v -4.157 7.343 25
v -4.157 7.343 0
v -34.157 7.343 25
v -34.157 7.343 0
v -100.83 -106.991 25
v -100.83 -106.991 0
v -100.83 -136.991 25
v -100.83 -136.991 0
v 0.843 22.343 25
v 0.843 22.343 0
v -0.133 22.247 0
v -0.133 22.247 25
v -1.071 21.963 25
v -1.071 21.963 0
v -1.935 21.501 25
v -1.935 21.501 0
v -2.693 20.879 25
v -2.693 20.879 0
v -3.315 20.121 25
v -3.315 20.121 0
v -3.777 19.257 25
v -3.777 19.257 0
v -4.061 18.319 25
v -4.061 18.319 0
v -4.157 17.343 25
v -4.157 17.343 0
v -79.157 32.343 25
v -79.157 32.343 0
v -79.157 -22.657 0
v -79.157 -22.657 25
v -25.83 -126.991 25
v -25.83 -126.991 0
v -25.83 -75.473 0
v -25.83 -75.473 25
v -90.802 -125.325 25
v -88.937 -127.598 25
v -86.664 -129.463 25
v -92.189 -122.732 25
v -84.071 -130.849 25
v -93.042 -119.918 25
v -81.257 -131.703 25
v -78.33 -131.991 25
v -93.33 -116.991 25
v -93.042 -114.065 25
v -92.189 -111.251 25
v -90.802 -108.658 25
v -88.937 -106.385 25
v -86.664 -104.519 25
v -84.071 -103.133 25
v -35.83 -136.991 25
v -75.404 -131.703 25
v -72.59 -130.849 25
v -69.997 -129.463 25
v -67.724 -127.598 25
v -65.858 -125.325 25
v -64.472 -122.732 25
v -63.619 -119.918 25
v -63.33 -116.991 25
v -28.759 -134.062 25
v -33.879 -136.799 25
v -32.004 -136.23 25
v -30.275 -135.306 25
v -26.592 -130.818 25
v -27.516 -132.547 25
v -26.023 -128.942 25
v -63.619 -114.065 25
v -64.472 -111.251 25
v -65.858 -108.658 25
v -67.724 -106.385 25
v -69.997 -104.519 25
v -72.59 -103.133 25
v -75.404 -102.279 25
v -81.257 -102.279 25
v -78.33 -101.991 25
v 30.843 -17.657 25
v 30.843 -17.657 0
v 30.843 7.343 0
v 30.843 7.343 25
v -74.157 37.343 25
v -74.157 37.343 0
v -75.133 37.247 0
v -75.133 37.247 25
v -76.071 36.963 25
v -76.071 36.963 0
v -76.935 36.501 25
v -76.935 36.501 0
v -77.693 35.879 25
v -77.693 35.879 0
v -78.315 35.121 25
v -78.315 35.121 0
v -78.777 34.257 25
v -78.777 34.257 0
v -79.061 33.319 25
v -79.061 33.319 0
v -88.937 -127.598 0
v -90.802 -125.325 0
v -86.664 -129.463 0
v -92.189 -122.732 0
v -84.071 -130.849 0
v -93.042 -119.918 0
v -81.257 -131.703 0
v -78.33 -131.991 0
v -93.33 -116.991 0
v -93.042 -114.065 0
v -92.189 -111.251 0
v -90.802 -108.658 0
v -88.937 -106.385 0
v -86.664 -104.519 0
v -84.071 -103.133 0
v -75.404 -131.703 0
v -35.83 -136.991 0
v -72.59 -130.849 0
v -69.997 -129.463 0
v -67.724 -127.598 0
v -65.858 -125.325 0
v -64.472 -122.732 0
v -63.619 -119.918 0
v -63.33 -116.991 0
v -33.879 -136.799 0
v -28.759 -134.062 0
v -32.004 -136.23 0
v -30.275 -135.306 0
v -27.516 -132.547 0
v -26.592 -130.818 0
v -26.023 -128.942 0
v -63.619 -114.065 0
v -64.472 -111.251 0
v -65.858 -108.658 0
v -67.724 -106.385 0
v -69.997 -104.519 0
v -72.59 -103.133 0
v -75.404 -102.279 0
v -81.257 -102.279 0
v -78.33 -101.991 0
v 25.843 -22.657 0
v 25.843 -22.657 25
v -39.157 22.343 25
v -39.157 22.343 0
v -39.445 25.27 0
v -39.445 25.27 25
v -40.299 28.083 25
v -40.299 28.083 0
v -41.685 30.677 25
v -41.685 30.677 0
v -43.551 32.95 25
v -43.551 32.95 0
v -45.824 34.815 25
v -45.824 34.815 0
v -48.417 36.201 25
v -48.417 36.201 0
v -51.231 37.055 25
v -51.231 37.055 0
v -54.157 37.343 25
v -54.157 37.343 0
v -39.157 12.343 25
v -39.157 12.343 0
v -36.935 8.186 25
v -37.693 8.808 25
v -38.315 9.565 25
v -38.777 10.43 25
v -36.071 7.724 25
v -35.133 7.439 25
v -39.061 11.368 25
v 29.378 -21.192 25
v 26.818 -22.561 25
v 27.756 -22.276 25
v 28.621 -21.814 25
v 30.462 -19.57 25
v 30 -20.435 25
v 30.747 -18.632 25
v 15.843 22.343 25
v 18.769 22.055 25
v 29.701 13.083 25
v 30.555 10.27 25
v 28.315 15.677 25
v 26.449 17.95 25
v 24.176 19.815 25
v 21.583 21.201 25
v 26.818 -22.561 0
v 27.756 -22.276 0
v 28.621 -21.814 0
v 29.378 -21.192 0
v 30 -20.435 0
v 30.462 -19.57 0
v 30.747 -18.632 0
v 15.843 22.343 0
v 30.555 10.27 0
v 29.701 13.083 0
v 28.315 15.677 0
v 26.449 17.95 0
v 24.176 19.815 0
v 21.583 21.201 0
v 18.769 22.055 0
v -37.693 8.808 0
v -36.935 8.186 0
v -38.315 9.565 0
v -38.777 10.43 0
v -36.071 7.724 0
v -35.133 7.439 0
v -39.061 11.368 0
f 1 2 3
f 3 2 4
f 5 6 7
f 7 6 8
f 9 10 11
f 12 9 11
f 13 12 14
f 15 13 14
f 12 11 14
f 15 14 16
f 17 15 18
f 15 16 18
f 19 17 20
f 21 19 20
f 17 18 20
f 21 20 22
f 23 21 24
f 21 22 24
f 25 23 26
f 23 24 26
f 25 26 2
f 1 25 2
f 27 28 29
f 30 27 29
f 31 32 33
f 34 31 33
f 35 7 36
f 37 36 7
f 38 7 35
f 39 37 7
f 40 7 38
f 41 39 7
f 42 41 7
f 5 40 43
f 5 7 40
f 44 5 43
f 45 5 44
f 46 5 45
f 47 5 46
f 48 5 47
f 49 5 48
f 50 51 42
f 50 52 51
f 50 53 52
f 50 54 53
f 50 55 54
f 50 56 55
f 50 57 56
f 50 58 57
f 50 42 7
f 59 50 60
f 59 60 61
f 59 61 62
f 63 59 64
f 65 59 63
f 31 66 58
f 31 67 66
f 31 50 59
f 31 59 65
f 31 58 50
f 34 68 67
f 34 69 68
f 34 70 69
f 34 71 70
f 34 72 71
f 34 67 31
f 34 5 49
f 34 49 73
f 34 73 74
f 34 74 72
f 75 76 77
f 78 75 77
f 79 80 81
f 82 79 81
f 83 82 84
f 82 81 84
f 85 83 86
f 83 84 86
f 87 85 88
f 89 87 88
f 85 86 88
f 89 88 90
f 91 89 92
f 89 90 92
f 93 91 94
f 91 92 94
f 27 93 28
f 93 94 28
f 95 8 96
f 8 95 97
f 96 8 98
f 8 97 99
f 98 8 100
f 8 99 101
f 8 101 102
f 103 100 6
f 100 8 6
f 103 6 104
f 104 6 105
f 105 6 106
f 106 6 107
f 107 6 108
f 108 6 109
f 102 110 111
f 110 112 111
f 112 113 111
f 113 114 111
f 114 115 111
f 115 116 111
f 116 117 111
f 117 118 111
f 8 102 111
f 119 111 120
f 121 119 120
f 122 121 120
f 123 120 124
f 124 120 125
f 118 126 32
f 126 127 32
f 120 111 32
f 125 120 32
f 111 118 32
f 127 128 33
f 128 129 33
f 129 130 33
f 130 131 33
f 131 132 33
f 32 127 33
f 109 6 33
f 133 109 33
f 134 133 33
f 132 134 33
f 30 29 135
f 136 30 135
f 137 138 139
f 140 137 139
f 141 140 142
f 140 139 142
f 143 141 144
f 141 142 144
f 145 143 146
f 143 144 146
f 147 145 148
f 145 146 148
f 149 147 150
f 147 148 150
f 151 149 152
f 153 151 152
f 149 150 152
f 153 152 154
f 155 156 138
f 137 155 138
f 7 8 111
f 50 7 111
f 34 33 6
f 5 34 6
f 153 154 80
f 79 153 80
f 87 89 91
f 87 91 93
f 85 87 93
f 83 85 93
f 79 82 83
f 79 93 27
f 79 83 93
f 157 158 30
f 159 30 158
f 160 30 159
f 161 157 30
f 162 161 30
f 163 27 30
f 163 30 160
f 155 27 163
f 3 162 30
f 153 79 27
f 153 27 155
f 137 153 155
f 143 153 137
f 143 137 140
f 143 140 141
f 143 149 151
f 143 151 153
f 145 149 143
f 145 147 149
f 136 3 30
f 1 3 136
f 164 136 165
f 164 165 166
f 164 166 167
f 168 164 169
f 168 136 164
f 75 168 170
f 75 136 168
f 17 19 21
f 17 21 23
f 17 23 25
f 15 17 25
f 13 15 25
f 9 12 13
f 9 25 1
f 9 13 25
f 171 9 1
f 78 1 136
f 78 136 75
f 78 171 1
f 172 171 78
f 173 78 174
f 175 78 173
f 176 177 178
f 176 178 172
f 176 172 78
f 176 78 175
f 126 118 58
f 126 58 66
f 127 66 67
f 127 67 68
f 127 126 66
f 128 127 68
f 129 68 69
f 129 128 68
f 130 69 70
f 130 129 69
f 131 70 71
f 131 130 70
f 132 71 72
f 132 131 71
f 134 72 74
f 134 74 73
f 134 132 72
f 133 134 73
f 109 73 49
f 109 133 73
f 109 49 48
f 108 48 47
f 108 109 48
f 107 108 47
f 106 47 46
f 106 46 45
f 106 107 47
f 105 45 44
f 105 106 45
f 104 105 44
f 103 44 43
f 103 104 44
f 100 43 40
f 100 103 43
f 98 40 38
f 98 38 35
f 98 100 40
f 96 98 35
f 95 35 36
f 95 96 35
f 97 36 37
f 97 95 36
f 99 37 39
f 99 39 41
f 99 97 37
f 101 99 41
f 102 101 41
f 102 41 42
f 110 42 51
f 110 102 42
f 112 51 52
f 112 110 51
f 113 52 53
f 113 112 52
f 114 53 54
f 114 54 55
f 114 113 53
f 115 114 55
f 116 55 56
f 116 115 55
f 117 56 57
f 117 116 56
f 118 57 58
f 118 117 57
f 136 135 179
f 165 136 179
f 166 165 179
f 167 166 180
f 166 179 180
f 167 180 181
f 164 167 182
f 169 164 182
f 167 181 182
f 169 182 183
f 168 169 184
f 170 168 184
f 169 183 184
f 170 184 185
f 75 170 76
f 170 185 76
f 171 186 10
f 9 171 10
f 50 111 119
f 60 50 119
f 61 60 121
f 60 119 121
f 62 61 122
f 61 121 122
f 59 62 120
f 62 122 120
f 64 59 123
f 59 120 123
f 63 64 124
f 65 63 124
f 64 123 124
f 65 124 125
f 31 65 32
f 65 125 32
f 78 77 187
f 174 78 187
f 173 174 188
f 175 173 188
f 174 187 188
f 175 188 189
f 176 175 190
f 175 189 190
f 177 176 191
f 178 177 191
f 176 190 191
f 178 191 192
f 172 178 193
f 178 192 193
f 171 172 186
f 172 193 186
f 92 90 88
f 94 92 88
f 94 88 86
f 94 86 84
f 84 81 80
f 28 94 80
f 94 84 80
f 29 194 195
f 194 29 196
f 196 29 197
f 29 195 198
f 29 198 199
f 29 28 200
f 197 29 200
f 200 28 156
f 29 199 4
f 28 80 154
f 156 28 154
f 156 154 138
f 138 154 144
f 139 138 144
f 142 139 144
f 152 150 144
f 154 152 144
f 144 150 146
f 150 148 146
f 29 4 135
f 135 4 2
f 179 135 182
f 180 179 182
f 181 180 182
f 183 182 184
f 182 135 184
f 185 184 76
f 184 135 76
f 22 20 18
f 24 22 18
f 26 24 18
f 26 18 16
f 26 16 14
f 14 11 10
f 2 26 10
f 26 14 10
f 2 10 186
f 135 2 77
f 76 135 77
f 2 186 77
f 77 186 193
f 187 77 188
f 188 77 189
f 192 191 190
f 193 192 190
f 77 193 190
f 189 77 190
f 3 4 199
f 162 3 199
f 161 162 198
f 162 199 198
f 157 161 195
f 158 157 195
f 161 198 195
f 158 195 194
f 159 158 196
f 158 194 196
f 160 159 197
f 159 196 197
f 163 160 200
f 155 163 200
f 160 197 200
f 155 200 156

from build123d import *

# Parameters (mm, degrees)
F1_DEPTH = 25
F0_R     = 15
F2_DEPTH = 25


with BuildPart() as f1:
    # F0 (on Top) → F1 (new body)
    with BuildSketch(Plane.XY):
        with BuildLine():
            Line((-79.157276, 32.343172), (-79.157276, -22.656828))
            Line((-79.157276, -22.656828), (25.842724, -22.656828))
            ThreePointArc((25.842724, -22.656828), (29.378258, -21.192362), (30.842724, -17.656828))
            Line((30.842724, -17.656828), (30.842724, 7.343172))
            ThreePointArc((30.842724, 7.343172), (26.449325, 17.949774), (15.842724, 22.343172))
            Line((15.842724, 22.343172), (0.842724, 22.343172))
            ThreePointArc((0.842724, 22.343172), (-2.69281, 20.878706), (-4.157276, 17.343172))
            Line((-4.157276, 17.343172), (-4.157276, 7.343172))
            Line((-4.157276, 7.343172), (-34.157276, 7.343172))
            ThreePointArc((-34.157276, 7.343172), (-37.69281, 8.807638), (-39.157276, 12.343172))
            Line((-39.157276, 12.343172), (-39.157276, 22.343172))
            ThreePointArc((-39.157276, 22.343172), (-43.550675, 32.949774), (-54.157276, 37.343172))
            Line((-54.157276, 37.343172), (-74.157276, 37.343172))
            ThreePointArc((-74.157276, 37.343172), (-77.69281, 35.878706), (-79.157276, 32.343172))
        make_face()
    extrude(amount=F1_DEPTH)


with BuildPart() as f2:
    # F0 (on Top) → F2 (new body)
    with BuildSketch(Plane.XY):
        with BuildLine():
            Line((-100.830384, -116.991277), (-100.830384, -136.991277))
            Line((-100.830384, -136.991277), (-78.330384, -136.991277))
            Line((-78.330384, -136.991277), (-35.830384, -136.991277))
            ThreePointArc((-35.830384, -136.991277), (-28.759316, -134.062345), (-25.830384, -126.991277))
            Line((-25.830384, -126.991277), (-25.830384, -75.472742))
            Line((-25.830384, -75.472742), (-100.830384, -106.991277))
            Line((-100.830384, -106.991277), (-100.830384, -116.991277))
        make_face()
        with Locations((-78.330384, -116.991277)):
            Circle(F0_R, mode=Mode.SUBTRACT)
    extrude(amount=F2_DEPTH)


solid = Compound([f1.part, f2.part])
